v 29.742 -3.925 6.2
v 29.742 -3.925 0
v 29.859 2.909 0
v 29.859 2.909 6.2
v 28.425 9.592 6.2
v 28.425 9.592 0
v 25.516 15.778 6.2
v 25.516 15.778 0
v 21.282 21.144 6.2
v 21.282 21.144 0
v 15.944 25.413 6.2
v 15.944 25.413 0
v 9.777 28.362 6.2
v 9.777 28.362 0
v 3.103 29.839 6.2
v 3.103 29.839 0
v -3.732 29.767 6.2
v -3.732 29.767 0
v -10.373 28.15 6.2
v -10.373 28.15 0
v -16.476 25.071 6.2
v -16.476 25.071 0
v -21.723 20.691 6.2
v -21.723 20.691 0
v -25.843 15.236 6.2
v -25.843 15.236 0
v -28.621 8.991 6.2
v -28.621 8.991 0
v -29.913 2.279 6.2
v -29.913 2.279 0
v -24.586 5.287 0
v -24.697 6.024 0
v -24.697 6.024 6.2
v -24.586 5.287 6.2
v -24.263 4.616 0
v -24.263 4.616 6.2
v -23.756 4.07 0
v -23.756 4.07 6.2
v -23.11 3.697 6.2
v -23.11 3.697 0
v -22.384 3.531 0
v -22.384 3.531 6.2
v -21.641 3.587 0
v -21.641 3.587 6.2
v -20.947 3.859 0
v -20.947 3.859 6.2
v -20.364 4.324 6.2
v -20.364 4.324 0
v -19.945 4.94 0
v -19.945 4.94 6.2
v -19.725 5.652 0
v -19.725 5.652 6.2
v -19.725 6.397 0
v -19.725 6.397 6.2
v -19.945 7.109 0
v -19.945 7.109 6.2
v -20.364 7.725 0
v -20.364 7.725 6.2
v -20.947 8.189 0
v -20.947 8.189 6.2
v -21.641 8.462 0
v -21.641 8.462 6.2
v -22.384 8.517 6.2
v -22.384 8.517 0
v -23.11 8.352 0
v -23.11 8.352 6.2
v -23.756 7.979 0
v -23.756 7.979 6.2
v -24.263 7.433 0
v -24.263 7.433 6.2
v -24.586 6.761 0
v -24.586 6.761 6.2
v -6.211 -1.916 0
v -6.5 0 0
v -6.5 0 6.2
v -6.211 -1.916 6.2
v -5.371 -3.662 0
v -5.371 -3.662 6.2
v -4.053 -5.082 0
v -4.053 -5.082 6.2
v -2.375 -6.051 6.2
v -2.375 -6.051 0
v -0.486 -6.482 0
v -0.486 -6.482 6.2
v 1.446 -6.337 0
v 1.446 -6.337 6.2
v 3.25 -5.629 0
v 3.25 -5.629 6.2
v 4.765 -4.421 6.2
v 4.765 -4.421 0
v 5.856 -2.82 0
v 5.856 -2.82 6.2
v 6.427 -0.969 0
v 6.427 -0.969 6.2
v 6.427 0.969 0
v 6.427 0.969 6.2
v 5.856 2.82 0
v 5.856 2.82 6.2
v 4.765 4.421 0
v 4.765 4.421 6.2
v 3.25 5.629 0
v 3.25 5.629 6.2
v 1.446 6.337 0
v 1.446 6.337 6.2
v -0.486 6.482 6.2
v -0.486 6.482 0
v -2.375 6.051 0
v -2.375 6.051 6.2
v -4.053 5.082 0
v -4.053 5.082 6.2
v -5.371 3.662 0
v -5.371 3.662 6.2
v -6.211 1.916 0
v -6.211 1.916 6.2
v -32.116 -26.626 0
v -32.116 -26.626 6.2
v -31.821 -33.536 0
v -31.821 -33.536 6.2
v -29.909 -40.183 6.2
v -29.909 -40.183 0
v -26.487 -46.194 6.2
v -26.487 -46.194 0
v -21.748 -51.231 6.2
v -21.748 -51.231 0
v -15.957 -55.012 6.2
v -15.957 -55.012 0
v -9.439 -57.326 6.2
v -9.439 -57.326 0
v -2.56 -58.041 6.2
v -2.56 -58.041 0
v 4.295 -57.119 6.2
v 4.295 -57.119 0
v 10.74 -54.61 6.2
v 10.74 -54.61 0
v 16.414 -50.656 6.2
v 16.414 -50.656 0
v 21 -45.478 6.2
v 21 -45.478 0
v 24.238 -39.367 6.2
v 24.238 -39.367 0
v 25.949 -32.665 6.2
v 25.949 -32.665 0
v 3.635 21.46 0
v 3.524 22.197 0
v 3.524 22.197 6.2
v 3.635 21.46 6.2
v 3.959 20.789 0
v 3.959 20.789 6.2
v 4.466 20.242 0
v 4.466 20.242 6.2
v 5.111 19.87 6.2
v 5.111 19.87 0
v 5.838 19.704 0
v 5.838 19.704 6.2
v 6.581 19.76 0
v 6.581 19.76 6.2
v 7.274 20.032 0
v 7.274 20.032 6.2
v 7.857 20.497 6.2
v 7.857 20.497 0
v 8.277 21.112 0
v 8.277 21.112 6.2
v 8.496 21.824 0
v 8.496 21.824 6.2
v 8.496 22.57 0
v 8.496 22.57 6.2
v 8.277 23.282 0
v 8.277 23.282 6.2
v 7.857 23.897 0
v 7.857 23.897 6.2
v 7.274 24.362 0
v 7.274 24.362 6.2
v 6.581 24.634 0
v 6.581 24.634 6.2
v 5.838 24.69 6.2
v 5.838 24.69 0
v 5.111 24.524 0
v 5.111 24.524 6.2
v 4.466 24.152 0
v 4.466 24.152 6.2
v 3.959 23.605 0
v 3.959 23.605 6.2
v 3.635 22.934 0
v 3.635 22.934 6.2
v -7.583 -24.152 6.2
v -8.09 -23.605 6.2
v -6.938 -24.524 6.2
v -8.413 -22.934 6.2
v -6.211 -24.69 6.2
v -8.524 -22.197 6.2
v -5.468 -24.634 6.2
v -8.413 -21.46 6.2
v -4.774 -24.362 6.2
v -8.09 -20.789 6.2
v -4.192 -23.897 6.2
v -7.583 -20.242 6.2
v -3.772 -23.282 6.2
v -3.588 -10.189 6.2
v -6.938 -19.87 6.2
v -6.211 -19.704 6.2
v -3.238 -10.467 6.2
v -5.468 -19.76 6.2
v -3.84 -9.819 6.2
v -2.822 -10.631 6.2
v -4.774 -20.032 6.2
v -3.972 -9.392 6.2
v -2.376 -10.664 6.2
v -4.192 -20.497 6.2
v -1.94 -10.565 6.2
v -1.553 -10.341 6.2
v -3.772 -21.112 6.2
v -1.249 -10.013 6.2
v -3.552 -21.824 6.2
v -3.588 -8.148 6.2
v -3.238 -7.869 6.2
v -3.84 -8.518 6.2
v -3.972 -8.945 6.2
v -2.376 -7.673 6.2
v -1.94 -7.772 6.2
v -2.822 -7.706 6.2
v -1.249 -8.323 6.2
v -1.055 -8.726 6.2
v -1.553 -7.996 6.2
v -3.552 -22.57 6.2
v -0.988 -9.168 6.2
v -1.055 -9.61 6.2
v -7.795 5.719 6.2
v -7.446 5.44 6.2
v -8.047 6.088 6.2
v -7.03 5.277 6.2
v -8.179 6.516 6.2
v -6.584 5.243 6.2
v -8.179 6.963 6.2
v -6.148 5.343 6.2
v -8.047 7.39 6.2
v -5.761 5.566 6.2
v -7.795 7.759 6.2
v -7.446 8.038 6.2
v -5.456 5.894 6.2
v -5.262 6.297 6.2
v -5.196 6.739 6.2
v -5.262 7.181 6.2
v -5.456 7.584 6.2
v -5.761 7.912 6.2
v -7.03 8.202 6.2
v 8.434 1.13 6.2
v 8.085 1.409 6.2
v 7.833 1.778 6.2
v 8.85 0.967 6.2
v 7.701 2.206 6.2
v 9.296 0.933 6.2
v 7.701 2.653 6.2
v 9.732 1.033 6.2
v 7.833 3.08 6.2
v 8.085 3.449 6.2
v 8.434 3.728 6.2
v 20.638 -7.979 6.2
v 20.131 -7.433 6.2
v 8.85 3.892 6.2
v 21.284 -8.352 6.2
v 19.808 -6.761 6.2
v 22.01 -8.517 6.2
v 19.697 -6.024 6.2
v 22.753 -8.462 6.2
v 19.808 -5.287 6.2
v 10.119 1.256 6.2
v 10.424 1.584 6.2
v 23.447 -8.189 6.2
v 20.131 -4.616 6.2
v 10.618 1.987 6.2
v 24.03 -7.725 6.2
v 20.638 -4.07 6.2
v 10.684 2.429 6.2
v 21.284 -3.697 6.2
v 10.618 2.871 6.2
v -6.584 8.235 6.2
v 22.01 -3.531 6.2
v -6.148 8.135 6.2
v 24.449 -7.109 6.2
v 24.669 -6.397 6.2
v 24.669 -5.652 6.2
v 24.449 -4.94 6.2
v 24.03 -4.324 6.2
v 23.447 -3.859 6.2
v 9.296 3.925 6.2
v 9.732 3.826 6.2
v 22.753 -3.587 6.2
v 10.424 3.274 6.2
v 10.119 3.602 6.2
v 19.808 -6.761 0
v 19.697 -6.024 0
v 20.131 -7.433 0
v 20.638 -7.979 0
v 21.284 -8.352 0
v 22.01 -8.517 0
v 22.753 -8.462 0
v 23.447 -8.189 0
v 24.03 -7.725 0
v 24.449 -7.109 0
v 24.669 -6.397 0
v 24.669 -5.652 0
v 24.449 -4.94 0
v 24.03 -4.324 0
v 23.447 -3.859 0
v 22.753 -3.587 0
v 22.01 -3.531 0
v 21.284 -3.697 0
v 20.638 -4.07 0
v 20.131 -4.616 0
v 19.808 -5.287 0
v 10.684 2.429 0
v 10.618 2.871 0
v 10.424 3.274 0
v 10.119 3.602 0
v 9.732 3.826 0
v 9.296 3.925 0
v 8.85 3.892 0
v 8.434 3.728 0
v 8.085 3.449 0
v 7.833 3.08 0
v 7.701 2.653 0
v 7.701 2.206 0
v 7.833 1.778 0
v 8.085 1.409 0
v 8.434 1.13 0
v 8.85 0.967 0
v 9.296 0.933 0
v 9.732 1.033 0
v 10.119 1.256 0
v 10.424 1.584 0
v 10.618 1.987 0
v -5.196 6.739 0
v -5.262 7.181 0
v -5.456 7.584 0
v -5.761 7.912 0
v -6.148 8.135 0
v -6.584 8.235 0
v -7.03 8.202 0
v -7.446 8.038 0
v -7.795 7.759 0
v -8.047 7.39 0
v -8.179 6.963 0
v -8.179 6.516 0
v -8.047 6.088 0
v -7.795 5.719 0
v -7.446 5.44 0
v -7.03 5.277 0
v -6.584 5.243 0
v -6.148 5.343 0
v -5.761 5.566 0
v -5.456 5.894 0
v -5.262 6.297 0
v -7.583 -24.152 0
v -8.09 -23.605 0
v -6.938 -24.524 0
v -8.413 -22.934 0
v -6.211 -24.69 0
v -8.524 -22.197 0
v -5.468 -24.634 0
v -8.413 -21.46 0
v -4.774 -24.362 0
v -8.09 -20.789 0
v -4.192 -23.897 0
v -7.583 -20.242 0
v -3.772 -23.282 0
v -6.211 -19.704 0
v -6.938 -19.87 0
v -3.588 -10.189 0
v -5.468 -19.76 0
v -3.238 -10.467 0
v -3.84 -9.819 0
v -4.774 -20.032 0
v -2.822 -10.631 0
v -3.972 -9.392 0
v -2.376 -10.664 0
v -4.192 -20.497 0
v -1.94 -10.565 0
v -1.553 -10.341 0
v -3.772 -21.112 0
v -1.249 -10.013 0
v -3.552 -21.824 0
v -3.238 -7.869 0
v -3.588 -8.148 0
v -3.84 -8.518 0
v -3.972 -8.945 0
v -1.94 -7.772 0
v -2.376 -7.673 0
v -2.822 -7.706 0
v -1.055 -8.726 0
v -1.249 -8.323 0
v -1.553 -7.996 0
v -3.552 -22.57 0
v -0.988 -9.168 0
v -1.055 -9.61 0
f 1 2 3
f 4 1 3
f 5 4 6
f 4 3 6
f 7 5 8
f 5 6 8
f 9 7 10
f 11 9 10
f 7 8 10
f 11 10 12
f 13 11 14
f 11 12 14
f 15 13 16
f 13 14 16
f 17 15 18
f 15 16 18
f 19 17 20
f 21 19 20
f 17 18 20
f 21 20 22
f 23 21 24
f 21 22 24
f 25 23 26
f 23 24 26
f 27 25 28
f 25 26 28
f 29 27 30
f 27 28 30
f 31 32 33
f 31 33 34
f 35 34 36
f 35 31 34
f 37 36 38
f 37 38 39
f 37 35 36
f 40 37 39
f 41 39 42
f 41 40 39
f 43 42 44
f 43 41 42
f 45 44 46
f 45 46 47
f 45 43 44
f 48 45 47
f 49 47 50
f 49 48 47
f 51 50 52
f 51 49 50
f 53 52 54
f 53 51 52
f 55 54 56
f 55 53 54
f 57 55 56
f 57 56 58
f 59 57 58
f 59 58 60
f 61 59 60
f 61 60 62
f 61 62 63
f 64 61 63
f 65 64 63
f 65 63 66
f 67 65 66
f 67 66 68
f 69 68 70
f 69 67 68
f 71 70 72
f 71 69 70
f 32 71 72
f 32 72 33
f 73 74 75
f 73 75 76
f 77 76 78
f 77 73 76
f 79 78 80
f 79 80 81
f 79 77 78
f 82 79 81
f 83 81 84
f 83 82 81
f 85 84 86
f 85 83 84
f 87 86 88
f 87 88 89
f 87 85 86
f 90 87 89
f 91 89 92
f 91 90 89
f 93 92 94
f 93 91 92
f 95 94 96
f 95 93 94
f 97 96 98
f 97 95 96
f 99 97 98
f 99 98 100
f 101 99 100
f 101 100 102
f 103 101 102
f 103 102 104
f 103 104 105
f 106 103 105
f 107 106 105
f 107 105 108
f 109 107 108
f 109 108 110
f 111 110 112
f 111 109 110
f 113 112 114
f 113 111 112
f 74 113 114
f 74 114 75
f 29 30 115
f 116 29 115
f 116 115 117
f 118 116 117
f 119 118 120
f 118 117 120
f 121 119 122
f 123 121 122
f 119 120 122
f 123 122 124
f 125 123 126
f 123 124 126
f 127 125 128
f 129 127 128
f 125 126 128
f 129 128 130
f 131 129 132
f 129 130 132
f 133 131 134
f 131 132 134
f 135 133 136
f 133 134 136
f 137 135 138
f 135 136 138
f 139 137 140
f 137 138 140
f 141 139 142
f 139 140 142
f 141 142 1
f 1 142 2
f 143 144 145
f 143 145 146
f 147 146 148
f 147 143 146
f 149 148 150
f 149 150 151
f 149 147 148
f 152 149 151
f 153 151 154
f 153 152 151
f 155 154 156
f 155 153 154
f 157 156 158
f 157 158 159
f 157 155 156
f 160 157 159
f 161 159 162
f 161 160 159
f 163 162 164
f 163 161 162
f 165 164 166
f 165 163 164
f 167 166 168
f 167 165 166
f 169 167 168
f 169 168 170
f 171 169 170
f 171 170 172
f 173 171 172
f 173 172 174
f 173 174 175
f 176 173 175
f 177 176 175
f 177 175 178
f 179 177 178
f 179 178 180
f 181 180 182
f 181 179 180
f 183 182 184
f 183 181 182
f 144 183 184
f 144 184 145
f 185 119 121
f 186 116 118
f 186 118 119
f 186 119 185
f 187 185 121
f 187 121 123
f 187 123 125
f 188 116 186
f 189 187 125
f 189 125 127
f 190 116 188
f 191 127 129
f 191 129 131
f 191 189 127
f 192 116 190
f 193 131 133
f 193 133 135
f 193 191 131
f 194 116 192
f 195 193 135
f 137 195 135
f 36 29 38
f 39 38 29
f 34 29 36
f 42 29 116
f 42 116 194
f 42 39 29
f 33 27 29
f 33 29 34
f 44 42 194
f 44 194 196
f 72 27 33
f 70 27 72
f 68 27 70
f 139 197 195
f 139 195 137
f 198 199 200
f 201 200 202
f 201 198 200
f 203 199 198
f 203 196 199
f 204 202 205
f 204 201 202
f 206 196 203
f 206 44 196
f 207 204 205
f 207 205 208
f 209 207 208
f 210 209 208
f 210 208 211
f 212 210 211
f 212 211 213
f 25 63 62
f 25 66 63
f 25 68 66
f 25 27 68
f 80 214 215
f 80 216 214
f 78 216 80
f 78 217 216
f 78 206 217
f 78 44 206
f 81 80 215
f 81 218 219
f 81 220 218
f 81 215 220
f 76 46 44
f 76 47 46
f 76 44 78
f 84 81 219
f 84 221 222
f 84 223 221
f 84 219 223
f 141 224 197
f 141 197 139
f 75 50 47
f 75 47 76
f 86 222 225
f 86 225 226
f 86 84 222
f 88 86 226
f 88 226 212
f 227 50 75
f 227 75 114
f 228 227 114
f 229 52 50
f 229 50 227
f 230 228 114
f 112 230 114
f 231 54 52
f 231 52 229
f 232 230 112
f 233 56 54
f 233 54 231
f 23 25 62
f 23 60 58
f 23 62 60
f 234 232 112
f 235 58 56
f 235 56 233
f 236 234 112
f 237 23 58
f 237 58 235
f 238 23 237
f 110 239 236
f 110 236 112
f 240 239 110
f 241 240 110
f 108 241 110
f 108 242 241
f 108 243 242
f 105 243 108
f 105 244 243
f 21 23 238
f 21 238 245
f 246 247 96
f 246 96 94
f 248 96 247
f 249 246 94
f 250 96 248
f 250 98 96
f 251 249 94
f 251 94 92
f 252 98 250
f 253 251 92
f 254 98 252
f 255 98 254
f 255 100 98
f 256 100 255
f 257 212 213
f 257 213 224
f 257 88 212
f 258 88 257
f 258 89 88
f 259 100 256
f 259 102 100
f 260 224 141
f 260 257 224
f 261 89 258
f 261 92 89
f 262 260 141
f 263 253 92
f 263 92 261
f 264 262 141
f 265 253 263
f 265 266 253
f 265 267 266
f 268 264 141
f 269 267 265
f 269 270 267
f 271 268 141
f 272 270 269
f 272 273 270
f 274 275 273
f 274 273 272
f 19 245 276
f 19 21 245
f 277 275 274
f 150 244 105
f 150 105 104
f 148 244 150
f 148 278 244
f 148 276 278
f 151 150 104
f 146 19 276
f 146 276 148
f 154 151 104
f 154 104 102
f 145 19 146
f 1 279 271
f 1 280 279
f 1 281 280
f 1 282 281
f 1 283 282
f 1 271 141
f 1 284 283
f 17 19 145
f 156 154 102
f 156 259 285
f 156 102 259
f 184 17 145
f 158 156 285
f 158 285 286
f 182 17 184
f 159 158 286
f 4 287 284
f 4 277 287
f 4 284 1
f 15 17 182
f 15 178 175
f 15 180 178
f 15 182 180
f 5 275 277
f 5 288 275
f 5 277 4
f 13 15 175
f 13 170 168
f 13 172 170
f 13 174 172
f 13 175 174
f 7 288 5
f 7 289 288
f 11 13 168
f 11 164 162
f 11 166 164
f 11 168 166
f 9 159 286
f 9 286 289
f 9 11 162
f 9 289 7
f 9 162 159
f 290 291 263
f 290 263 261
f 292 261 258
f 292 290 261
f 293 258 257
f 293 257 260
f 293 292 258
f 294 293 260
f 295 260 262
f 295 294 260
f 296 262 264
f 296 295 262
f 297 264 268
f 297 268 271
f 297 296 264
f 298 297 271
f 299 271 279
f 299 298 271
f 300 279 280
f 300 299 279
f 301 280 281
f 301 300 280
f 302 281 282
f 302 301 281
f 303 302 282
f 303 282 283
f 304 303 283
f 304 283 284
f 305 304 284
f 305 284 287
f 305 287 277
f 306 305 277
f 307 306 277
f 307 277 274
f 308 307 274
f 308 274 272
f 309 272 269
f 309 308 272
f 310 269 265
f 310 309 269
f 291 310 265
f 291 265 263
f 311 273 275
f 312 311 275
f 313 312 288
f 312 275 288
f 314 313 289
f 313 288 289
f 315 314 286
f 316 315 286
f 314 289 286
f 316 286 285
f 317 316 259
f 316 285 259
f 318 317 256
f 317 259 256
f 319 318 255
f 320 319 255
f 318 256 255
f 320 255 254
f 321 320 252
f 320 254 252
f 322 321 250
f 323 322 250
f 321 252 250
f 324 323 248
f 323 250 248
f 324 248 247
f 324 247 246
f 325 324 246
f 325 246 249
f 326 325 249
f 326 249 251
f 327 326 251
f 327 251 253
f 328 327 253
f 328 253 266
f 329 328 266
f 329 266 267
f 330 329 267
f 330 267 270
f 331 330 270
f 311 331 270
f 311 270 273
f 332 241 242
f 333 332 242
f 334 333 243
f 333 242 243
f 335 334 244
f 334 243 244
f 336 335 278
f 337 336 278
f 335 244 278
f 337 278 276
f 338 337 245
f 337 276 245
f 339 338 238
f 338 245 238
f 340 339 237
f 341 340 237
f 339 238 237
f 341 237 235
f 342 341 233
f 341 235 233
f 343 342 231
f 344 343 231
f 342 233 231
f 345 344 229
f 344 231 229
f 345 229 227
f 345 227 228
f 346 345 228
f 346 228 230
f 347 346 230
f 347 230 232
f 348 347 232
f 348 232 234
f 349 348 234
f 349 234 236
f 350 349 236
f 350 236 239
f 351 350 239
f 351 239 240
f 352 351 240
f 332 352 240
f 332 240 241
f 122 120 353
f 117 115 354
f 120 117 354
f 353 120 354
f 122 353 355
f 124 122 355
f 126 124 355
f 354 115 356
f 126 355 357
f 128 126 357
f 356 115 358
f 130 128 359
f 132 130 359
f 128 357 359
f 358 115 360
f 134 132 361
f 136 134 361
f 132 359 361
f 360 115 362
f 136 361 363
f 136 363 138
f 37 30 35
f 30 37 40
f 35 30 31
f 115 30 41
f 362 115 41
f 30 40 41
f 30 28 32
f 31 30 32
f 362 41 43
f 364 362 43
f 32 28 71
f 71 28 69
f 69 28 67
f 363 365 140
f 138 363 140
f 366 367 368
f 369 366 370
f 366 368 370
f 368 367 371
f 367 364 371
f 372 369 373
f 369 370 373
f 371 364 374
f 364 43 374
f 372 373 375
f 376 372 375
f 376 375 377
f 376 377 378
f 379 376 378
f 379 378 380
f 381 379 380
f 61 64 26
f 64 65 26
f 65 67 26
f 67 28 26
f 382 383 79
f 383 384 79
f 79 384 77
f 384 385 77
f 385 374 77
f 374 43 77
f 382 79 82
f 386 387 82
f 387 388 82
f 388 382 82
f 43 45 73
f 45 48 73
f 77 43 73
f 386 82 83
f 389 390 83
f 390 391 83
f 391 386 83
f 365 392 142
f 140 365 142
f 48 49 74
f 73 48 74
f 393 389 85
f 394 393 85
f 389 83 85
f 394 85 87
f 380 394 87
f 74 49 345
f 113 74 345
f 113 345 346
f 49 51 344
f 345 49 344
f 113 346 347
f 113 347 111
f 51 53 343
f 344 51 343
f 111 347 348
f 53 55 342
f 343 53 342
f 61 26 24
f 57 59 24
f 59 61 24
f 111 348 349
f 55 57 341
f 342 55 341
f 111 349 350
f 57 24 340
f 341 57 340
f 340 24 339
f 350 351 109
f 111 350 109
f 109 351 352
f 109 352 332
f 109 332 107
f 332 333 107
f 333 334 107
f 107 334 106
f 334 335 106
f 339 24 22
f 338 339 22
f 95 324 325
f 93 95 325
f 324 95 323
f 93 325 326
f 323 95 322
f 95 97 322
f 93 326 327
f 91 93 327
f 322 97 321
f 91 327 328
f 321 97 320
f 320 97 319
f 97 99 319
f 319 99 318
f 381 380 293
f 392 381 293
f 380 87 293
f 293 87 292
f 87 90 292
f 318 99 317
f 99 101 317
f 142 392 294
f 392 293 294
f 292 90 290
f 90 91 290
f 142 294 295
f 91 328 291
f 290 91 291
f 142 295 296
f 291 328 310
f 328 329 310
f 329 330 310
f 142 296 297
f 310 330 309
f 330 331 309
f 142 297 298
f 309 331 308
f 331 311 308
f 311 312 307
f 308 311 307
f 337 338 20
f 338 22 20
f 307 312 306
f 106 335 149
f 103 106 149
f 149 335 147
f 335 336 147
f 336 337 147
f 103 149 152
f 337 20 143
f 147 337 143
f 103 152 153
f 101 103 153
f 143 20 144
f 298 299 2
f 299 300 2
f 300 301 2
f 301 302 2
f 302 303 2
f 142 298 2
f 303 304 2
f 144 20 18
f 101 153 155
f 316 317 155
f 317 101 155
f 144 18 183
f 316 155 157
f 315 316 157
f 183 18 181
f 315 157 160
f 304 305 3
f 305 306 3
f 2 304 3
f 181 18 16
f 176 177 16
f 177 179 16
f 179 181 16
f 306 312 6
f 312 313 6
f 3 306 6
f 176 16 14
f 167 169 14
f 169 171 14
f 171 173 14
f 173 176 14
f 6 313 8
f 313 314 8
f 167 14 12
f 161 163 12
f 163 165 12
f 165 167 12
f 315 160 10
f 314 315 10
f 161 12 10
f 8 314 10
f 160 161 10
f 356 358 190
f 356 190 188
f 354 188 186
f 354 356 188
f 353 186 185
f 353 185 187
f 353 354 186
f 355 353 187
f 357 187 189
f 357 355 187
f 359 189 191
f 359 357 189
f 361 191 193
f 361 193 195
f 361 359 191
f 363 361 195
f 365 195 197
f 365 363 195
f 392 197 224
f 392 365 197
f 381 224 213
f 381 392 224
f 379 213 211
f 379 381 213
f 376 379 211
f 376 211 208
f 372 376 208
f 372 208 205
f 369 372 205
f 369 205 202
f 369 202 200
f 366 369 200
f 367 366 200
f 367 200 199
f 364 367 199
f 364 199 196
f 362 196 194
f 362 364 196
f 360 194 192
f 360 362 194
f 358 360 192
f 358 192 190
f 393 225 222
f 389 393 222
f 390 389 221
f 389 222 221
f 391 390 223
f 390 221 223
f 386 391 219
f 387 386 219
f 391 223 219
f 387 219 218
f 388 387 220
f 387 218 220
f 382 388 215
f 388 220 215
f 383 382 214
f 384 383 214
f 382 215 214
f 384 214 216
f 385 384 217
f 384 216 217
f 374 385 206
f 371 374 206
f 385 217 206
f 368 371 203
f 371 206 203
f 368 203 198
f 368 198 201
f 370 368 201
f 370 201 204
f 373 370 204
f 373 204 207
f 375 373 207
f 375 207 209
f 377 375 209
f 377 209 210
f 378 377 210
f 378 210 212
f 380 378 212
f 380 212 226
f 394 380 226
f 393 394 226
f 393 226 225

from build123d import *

# Parameters (mm, degrees)
SKETCH1_R           = 2.5
SKETCH1_R_2         = 6.5
BOSS_EXTRUDE1_DEPTH = 6.2
CUT_EXTRUDE1_REACH  = 68.667
SKETCH2_R           = 1.5


with BuildPart() as part:
    # Sketch1 → Boss-Extrude1 (new body)
    with BuildSketch(Plane.XY):
        with BuildLine():
            Line((25.948954725, -32.665145778), (29.742076772, -3.925413261))
            ThreePointArc((29.742076772, -3.925413261), (3.103448276, 29.839045038), (-29.913301505, 2.279121121))
            Line((-29.913301505, 2.279121121), (-32.115613465, -26.626065646))
            ThreePointArc((-32.115613465, -26.626065646), (-6.020689655, -57.887747374), (25.948954725, -32.665145778))
        make_face()
        with Locations(Location((22.196999252, -6.024385794, 0), (0, 0, 180))):
            Circle(SKETCH1_R, mode=Mode.SUBTRACT)
        with Locations(Location((-22.196999252, 6.024385794, 0), (0, 0, 180))):
            Circle(SKETCH1_R, mode=Mode.SUBTRACT)
        with Locations(Location((6.024385794, 22.196999252, 0), (0, 0, 180))):
            Circle(SKETCH1_R, mode=Mode.SUBTRACT)
        with Locations(Location((-6.024385794, -22.196999252, 0), (0, 0, 180))):
            Circle(SKETCH1_R, mode=Mode.SUBTRACT)
        with Locations(Location((0, 0, 0), (0, 0, 180))):
            Circle(SKETCH1_R_2, mode=Mode.SUBTRACT)
    extrude(amount=BOSS_EXTRUDE1_DEPTH)

    # Sketch2 → Cut-Extrude1 (cut, up to next)
    with BuildSketch(Plane.XY.offset(6.2), mode=Mode.PRIVATE) as cut_extrude1_sk1:
        with Locations((9.184169665, 2.42920307)):
            Circle(SKETCH2_R)
    cut_extrude1_tool1 = extrude(cut_extrude1_sk1.sketch, amount=-CUT_EXTRUDE1_REACH, mode=Mode.PRIVATE) & part.part
    # Sketch2 → Cut-Extrude1 (cut, up to next)
    with BuildSketch(Plane.XY.offset(6.2), mode=Mode.PRIVATE) as cut_extrude1_sk2:
        with Locations((-6.695836403, 6.739122708)):
            Circle(SKETCH2_R)
    cut_extrude1_tool2 = extrude(cut_extrude1_sk2.sketch, amount=-CUT_EXTRUDE1_REACH, mode=Mode.PRIVATE) & part.part
    # Sketch2 → Cut-Extrude1 (cut, up to next)
    with BuildSketch(Plane.XY.offset(6.2), mode=Mode.PRIVATE) as cut_extrude1_sk3:
        with Locations((-2.488333263, -9.168325778)):
            Circle(SKETCH2_R)
    cut_extrude1_tool3 = extrude(cut_extrude1_sk3.sketch, amount=-CUT_EXTRUDE1_REACH, mode=Mode.PRIVATE) & part.part
    add(cut_extrude1_tool1.solids().sort_by_distance((9.18417, 2.429203, 6.2))[0], mode=Mode.SUBTRACT)
    add(cut_extrude1_tool2.solids().sort_by_distance((-6.695836, 6.739123, 6.2))[0], mode=Mode.SUBTRACT)
    add(cut_extrude1_tool3.solids().sort_by_distance((-2.488333, -9.168326, 6.2))[0], mode=Mode.SUBTRACT)


solid = part.part
